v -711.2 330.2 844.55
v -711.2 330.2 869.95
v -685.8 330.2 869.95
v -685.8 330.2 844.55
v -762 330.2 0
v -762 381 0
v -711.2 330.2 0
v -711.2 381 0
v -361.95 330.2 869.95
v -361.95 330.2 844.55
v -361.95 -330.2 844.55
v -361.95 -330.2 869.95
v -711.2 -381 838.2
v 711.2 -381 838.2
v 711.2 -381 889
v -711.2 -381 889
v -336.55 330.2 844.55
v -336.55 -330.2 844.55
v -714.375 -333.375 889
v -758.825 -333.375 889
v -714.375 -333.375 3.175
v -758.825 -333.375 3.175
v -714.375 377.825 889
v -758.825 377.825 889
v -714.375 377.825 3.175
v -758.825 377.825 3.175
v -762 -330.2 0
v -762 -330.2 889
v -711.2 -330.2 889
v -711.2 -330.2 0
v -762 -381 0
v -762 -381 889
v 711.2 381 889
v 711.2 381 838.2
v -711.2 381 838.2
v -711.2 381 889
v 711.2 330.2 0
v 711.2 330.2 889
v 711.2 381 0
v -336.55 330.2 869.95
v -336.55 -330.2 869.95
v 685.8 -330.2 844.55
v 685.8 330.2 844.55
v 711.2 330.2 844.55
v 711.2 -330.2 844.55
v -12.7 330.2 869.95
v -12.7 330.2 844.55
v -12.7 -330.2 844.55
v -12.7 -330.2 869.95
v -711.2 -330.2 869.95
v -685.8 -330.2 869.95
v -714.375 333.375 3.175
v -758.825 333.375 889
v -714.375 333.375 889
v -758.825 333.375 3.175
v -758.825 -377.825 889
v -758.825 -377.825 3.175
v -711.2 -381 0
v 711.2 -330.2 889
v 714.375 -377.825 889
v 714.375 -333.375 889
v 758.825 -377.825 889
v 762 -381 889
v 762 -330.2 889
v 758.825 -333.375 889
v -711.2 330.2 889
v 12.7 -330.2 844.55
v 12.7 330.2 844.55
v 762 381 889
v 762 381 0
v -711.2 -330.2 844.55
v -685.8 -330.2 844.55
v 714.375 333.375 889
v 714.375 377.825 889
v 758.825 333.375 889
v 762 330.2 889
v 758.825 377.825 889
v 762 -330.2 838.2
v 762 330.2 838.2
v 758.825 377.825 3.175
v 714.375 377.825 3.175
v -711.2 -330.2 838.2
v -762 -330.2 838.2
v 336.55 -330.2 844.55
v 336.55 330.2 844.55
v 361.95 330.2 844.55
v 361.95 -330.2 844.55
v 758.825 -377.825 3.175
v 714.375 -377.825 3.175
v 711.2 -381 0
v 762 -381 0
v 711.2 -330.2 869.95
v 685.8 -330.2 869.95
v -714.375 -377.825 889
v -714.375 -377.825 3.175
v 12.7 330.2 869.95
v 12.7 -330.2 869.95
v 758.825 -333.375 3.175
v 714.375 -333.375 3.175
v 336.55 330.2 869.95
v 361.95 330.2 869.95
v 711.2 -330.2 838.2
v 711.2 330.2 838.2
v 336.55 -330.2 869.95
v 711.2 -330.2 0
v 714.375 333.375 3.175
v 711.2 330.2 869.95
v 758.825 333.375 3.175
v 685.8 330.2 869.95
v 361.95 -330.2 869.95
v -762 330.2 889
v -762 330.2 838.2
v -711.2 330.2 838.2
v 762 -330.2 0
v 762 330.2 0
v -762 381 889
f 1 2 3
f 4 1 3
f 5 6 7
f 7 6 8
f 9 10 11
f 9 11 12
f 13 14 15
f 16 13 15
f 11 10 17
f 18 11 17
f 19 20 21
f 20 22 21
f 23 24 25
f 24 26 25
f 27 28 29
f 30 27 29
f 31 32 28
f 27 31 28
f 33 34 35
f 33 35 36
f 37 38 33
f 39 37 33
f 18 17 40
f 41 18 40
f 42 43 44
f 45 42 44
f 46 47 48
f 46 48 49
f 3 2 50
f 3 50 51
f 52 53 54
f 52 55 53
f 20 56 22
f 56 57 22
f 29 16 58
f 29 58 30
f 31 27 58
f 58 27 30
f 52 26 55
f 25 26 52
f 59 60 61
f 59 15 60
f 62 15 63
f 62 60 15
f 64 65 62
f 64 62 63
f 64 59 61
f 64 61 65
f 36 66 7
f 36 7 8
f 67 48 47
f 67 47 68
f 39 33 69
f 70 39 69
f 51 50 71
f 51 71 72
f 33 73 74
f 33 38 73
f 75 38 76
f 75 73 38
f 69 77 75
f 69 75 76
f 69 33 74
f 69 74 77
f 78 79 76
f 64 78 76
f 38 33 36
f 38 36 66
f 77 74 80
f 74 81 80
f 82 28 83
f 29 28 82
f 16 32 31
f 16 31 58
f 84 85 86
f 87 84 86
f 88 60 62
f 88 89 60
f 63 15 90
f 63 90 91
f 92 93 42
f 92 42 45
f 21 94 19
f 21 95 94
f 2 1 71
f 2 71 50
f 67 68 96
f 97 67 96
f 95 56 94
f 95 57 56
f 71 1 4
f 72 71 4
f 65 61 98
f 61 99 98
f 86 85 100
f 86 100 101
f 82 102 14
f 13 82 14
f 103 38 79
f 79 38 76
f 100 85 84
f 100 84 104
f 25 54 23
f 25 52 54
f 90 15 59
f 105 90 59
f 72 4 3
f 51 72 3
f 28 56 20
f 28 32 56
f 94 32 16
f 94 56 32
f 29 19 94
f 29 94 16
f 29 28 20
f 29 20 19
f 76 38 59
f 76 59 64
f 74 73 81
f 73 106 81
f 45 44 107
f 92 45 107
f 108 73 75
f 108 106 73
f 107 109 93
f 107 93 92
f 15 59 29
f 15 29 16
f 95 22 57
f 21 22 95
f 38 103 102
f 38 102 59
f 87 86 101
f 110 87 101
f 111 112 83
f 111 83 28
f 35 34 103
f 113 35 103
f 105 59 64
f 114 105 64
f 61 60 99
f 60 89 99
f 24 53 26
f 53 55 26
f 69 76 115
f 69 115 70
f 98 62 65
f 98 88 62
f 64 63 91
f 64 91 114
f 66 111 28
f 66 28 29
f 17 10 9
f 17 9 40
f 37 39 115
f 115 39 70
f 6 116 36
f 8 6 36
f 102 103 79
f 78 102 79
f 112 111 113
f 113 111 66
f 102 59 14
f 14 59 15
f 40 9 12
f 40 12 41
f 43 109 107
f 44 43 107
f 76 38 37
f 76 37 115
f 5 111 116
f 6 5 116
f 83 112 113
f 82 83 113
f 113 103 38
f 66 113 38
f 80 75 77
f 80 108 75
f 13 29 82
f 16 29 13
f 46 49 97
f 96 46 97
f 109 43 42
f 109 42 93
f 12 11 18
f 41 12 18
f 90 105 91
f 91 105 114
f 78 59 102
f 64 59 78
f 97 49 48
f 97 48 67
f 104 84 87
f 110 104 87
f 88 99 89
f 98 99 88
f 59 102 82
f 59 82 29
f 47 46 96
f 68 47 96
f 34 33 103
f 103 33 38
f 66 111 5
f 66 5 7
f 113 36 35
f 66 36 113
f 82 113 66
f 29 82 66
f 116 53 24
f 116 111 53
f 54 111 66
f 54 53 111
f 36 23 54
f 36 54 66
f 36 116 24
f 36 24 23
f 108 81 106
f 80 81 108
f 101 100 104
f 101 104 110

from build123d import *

# Parameters (mm, degrees)
F0_W     = 50.8
F0_H     = 50.8
F1_DEPTH = 889
F2_T     = -3.175
F2_2_T   = -3.175
F2_3_T   = -3.175
F2_4_T   = -3.175
F3_W     = 50.8
F3_H     = 50.8
F4_DEPTH = 660.4
F5_W     = 50.8
F5_H     = 50.8
F6_DEPTH = 1422.4
F7_W     = 25.4
F7_H     = 25.4
F8_DEPTH = 660.4


with BuildPart() as f1:
    # F0 (on Top) → F1 (new body)
    with BuildSketch(Plane.XY):
        with Locations((-736.6, 355.6)):
            Rectangle(F0_W, F0_H)
    extrude(amount=F1_DEPTH)

    # F2#2
    f2_2_openings = [f1.faces().sort_by_distance(p)[0] for p in [
        (-736.6, 355.6, 889),
    ]]
    offset(amount=F2_2_T, openings=f2_2_openings)


with BuildPart() as f1b:
    # F0 (on Top) → F1, piece 2 (new body)
    with BuildSketch(Plane.XY):
        with Locations((736.6, 355.6)):
            Rectangle(F0_W, F0_H)
    extrude(amount=F1_DEPTH)

    # F2#3
    f2_3_openings = [f1b.faces().sort_by_distance(p)[0] for p in [
        (736.6, 355.6, 889),
    ]]
    offset(amount=F2_3_T, openings=f2_3_openings)


with BuildPart() as f1c:
    # F0 (on Top) → F1, piece 3 (new body)
    with BuildSketch(Plane.XY):
        with Locations((736.6, -355.6)):
            Rectangle(F0_W, F0_H)
    extrude(amount=F1_DEPTH)

    # F2#4
    f2_4_openings = [f1c.faces().sort_by_distance(p)[0] for p in [
        (736.6, -355.6, 889),
    ]]
    offset(amount=F2_4_T, openings=f2_4_openings)


with BuildPart() as f1d:
    # F0 (on Top) → F1, piece 4 (new body)
    with BuildSketch(Plane.XY):
        with Locations((-736.6, -355.6)):
            Rectangle(F0_W, F0_H)
    extrude(amount=F1_DEPTH)

    # F2
    f2_openings = [f1d.faces().sort_by_distance(p)[0] for p in [
        (-736.6, -355.6, 889),
    ]]
    offset(amount=F2_T, openings=f2_openings)


with BuildPart() as f4:
    # F3 (on face) → F4 (new body)
    with BuildSketch(Plane.XZ.offset(-330.2)):
        with Locations((-736.6, 863.6)):
            Rectangle(F3_W, F3_H)
    extrude(amount=F4_DEPTH)


with BuildPart() as f4b:
    # F3 (on face) → F4, piece 2 (new body)
    with BuildSketch(Plane.XZ.offset(-330.2)):
        with Locations((736.6, 863.6)):
            Rectangle(F3_W, F3_H)
    extrude(amount=F4_DEPTH)


with BuildPart() as f6:
    # F5 (on face) → F6 (new body)
    with BuildSketch(Plane(origin=(711.2, 0, 0), x_dir=(0, -1, 0), z_dir=(-1, 0, 0))):
        with Locations((-355.6, 863.6)):
            Rectangle(F5_W, F5_H)
    extrude(amount=F6_DEPTH)


with BuildPart() as f6b:
    # F5 (on face) → F6, piece 2 (new body)
    with BuildSketch(Plane(origin=(711.2, 0, 0), x_dir=(0, -1, 0), z_dir=(-1, 0, 0))):
        with Locations((355.6, 863.6)):
            Rectangle(F5_W, F5_H)
    extrude(amount=F6_DEPTH)


with BuildPart() as f8:
    # F7 (on face) → F8 (new body)
    with BuildSketch(Plane.XZ.offset(-330.2)):
        with Locations((-349.25, 857.25)):
            Rectangle(F7_W, F7_H)
    extrude(amount=F8_DEPTH)


with BuildPart() as f8b:
    # F7 (on face) → F8, piece 2 (new body)
    with BuildSketch(Plane.XZ.offset(-330.2)):
        with Locations((0, 857.25)):
            Rectangle(F7_W, F7_H)
    extrude(amount=F8_DEPTH)


with BuildPart() as f8c:
    # F7 (on face) → F8, piece 3 (new body)
    with BuildSketch(Plane.XZ.offset(-330.2)):
        with Locations((349.25, 857.25)):
            Rectangle(F7_W, F7_H)
    extrude(amount=F8_DEPTH)


with BuildPart() as f8d:
    # F7 (on face) → F8, piece 4 (new body)
    with BuildSketch(Plane.XZ.offset(-330.2)):
        with Locations((-698.5, 857.25)):
            Rectangle(F7_W, F7_H)
    extrude(amount=F8_DEPTH)


with BuildPart() as f8e:
    # F7 (on face) → F8, piece 5 (new body)
    with BuildSketch(Plane.XZ.offset(-330.2)):
        with Locations((698.5, 857.25)):
            Rectangle(F7_W, F7_H)
    extrude(amount=F8_DEPTH)


solid = Compound([f1.part, f1b.part, f1c.part, f1d.part, f4.part, f4b.part, f6.part, f6b.part, f8.part, f8b.part, f8c.part, f8d.part, f8e.part])
